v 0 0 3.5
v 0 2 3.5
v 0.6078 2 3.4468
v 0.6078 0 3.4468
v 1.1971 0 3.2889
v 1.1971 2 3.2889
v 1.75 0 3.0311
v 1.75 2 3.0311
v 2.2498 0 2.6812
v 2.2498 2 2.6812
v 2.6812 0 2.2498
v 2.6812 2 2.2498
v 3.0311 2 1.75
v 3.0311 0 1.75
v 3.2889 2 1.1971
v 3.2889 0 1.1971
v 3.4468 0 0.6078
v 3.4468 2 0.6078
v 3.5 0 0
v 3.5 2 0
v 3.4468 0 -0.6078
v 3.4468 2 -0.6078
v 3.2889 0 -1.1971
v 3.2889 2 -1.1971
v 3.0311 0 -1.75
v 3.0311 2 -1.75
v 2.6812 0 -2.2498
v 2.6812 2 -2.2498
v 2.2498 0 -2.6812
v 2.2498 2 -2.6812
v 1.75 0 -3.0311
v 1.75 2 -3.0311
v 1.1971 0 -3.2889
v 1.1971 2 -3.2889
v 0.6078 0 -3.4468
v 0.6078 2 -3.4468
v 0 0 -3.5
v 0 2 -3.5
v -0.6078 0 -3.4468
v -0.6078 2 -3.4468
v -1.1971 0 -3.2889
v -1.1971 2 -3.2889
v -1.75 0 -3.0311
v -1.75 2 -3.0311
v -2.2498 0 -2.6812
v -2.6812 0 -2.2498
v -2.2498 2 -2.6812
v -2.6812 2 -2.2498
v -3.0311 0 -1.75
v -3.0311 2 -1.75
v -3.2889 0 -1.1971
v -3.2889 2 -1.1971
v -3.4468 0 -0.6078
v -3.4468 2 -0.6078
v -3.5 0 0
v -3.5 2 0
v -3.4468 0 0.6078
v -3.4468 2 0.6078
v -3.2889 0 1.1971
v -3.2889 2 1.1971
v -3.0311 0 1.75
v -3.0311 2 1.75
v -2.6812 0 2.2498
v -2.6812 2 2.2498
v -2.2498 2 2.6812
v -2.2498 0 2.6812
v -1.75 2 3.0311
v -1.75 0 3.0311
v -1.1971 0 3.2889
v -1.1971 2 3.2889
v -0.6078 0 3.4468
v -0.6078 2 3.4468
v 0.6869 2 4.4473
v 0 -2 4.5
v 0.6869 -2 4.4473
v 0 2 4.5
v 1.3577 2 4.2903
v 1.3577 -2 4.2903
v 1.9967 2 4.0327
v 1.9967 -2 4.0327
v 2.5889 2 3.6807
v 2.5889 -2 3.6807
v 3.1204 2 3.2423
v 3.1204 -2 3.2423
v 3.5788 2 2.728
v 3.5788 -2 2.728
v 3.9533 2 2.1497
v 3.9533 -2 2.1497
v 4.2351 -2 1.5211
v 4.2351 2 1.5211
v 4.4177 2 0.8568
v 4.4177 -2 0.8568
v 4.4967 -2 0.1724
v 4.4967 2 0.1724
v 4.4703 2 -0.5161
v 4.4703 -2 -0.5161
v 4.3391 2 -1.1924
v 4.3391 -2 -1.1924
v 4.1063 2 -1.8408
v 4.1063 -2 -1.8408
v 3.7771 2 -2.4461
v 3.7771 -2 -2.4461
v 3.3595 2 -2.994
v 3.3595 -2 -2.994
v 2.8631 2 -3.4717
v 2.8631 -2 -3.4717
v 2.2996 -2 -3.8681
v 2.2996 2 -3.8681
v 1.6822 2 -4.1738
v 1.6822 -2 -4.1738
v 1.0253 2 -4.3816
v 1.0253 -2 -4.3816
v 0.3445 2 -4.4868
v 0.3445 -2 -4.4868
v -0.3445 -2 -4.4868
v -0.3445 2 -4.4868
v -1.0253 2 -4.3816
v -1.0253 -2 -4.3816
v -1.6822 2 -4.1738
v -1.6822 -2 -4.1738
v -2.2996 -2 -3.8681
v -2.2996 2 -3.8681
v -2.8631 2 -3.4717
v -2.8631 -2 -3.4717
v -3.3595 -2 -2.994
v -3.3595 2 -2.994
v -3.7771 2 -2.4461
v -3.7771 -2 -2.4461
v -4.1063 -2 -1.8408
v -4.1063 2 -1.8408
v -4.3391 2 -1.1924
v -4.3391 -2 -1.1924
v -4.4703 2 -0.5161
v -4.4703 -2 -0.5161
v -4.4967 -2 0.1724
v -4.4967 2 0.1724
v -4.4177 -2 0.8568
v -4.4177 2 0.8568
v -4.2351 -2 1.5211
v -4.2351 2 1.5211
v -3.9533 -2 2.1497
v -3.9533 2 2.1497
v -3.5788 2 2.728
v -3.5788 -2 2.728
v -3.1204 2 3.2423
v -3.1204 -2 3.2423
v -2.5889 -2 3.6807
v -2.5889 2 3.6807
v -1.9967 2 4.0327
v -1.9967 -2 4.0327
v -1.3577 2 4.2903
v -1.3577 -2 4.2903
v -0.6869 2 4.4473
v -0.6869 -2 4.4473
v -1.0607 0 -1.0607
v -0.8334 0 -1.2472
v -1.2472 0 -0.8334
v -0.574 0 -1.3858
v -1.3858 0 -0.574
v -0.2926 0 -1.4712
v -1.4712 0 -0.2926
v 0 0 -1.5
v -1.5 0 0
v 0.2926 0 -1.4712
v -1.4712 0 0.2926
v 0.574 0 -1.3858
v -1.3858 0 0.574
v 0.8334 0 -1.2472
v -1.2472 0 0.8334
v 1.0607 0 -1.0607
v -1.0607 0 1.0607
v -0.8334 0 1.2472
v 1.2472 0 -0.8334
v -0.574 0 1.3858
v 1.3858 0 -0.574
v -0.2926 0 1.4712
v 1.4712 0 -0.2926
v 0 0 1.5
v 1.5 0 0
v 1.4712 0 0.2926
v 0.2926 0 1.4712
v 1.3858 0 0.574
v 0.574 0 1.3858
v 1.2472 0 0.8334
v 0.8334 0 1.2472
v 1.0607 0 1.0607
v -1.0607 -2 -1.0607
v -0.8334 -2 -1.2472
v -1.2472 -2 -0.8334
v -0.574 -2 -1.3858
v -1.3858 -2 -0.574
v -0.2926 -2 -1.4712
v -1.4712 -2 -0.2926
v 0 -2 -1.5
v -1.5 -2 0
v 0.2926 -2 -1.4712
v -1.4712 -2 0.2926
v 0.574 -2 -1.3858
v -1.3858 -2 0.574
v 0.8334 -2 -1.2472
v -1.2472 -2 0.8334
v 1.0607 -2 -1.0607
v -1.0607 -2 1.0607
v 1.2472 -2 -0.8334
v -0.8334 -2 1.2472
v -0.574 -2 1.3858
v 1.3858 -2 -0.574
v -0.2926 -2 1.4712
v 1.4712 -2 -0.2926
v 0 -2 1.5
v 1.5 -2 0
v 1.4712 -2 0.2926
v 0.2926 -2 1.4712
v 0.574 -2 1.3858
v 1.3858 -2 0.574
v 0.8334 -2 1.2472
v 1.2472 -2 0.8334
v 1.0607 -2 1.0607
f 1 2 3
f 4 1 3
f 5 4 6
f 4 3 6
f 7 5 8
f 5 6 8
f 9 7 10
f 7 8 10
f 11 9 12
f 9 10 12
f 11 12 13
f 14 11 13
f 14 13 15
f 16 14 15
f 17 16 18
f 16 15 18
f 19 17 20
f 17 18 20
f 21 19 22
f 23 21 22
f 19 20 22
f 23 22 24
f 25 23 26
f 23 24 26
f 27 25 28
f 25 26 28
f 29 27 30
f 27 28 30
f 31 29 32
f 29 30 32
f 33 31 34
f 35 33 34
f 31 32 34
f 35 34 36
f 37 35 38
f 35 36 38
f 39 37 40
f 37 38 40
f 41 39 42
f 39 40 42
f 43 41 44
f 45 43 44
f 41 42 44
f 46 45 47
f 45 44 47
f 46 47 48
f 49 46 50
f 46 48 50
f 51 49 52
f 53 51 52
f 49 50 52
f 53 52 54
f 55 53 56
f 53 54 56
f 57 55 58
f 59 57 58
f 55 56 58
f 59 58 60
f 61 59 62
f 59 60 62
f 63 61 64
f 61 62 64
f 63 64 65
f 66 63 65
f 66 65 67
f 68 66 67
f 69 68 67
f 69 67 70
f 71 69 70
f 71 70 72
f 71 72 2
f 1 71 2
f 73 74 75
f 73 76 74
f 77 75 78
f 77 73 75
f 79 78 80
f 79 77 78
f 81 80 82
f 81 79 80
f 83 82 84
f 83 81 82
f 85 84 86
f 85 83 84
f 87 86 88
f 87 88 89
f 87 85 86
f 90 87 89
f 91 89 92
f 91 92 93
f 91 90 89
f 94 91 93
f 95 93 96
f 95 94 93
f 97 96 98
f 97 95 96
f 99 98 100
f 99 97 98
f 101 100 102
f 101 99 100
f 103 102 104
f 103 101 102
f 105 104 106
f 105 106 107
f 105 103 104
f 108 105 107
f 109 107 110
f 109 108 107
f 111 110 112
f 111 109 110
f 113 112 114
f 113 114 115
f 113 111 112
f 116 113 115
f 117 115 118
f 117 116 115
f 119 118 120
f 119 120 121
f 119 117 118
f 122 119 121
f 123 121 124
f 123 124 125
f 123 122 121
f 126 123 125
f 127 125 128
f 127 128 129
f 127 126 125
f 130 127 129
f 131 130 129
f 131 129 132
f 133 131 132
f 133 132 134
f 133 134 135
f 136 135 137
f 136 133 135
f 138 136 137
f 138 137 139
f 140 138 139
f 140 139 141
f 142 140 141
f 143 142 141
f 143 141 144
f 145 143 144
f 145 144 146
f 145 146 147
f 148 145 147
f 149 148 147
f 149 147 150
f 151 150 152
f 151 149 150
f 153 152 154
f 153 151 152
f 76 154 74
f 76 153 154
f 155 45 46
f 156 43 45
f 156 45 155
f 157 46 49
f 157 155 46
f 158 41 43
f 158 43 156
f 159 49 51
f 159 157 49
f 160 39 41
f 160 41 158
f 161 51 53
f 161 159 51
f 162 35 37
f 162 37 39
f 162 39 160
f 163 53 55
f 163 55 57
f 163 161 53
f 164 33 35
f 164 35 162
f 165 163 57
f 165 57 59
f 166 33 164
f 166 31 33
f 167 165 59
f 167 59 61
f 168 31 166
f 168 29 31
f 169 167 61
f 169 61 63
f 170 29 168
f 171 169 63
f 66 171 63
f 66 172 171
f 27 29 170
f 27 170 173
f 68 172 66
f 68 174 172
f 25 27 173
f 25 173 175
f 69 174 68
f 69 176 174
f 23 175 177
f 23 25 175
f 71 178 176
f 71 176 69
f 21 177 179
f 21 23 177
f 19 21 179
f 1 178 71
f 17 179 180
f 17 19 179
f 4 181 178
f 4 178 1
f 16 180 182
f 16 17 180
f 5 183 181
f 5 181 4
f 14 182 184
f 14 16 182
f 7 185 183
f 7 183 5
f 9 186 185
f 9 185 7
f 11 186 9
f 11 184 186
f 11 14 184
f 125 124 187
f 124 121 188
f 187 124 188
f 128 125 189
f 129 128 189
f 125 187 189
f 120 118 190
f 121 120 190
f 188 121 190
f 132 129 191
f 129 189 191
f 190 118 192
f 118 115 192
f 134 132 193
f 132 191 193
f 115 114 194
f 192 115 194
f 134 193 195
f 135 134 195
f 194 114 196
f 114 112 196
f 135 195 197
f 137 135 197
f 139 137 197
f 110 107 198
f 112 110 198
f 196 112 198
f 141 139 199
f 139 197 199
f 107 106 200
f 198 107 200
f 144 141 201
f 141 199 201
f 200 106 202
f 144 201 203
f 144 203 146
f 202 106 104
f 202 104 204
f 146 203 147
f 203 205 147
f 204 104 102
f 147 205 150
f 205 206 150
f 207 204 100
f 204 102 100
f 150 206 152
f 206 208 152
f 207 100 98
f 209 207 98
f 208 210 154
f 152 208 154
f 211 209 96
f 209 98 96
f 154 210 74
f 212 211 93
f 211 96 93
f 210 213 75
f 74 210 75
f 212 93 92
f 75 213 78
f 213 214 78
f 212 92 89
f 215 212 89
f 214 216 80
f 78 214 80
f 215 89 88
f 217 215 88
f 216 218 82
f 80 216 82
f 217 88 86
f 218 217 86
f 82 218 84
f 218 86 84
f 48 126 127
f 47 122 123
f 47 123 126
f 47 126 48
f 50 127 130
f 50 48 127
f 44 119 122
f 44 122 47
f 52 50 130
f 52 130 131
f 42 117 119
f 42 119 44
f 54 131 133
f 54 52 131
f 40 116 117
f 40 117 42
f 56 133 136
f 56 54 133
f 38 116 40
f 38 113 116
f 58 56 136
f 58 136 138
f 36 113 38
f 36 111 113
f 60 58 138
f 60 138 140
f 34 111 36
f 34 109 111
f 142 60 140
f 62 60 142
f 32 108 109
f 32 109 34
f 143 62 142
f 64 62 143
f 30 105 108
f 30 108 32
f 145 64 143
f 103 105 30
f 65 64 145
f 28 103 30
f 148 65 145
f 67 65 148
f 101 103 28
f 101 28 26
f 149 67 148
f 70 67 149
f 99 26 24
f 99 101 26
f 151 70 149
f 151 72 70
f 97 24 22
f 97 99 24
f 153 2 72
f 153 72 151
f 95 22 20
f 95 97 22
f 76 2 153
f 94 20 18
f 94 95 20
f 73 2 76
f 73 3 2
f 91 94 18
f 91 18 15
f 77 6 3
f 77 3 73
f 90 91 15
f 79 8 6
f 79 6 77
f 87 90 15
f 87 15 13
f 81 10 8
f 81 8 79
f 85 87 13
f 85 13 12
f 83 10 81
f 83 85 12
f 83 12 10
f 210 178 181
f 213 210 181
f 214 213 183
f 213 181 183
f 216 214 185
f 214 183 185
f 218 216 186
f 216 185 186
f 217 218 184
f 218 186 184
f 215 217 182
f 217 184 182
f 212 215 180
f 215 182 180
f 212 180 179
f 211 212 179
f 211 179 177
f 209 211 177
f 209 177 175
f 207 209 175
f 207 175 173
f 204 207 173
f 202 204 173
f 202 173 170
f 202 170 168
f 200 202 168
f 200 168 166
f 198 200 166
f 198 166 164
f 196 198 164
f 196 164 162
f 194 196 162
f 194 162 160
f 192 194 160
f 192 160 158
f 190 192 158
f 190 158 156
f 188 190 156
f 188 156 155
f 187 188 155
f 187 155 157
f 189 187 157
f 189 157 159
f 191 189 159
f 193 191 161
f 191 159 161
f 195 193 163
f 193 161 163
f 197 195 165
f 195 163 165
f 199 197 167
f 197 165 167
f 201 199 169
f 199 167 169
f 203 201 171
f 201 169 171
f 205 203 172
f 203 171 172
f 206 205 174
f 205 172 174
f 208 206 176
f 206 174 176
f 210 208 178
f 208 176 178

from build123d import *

# Parameters (mm, degrees)
SKETCH_1_R          = 4.5
EXTRUDE_1_DEPTH     = 2
SKETCH_2_R          = 3.5
CUT_EXTRUDE_1_DEPTH = 2
SKETCH_3_R          = 1.5
CUT_EXTRUDE_2_DEPTH = 7.670832032


with BuildPart() as part:
    # 草图1 → 凸台-拉伸1 (new, symmetric)
    with BuildSketch(Plane(origin=(0, 0, 0), x_dir=(1, 0, 0), z_dir=(0, 1, 0))):
        with Locations(Location((0, 0, 0), (0, 0, 270))):
            Circle(SKETCH_1_R)
    extrude(amount=EXTRUDE_1_DEPTH, both=True)

    # 草图2 → 切除-拉伸1 (cut)
    with BuildSketch(Plane(origin=(0, 2, 0), x_dir=(1, 0, 0), z_dir=(0, 1, 0))):
        with Locations(Location((0, 0, 0), (0, 0, 270))):
            Circle(SKETCH_2_R)
    extrude(amount=-CUT_EXTRUDE_1_DEPTH, mode=Mode.SUBTRACT)

    # 草图3 → 切除-拉伸2 (cut, through all)
    with BuildSketch(Plane(origin=(0, 0, 0), x_dir=(1, 0, 0), z_dir=(0, 1, 0))):
        with Locations(Location((0, 0, 0), (0, 0, 270))):
            Circle(SKETCH_3_R)
    extrude(amount=-CUT_EXTRUDE_2_DEPTH, mode=Mode.SUBTRACT)


solid = part.part
